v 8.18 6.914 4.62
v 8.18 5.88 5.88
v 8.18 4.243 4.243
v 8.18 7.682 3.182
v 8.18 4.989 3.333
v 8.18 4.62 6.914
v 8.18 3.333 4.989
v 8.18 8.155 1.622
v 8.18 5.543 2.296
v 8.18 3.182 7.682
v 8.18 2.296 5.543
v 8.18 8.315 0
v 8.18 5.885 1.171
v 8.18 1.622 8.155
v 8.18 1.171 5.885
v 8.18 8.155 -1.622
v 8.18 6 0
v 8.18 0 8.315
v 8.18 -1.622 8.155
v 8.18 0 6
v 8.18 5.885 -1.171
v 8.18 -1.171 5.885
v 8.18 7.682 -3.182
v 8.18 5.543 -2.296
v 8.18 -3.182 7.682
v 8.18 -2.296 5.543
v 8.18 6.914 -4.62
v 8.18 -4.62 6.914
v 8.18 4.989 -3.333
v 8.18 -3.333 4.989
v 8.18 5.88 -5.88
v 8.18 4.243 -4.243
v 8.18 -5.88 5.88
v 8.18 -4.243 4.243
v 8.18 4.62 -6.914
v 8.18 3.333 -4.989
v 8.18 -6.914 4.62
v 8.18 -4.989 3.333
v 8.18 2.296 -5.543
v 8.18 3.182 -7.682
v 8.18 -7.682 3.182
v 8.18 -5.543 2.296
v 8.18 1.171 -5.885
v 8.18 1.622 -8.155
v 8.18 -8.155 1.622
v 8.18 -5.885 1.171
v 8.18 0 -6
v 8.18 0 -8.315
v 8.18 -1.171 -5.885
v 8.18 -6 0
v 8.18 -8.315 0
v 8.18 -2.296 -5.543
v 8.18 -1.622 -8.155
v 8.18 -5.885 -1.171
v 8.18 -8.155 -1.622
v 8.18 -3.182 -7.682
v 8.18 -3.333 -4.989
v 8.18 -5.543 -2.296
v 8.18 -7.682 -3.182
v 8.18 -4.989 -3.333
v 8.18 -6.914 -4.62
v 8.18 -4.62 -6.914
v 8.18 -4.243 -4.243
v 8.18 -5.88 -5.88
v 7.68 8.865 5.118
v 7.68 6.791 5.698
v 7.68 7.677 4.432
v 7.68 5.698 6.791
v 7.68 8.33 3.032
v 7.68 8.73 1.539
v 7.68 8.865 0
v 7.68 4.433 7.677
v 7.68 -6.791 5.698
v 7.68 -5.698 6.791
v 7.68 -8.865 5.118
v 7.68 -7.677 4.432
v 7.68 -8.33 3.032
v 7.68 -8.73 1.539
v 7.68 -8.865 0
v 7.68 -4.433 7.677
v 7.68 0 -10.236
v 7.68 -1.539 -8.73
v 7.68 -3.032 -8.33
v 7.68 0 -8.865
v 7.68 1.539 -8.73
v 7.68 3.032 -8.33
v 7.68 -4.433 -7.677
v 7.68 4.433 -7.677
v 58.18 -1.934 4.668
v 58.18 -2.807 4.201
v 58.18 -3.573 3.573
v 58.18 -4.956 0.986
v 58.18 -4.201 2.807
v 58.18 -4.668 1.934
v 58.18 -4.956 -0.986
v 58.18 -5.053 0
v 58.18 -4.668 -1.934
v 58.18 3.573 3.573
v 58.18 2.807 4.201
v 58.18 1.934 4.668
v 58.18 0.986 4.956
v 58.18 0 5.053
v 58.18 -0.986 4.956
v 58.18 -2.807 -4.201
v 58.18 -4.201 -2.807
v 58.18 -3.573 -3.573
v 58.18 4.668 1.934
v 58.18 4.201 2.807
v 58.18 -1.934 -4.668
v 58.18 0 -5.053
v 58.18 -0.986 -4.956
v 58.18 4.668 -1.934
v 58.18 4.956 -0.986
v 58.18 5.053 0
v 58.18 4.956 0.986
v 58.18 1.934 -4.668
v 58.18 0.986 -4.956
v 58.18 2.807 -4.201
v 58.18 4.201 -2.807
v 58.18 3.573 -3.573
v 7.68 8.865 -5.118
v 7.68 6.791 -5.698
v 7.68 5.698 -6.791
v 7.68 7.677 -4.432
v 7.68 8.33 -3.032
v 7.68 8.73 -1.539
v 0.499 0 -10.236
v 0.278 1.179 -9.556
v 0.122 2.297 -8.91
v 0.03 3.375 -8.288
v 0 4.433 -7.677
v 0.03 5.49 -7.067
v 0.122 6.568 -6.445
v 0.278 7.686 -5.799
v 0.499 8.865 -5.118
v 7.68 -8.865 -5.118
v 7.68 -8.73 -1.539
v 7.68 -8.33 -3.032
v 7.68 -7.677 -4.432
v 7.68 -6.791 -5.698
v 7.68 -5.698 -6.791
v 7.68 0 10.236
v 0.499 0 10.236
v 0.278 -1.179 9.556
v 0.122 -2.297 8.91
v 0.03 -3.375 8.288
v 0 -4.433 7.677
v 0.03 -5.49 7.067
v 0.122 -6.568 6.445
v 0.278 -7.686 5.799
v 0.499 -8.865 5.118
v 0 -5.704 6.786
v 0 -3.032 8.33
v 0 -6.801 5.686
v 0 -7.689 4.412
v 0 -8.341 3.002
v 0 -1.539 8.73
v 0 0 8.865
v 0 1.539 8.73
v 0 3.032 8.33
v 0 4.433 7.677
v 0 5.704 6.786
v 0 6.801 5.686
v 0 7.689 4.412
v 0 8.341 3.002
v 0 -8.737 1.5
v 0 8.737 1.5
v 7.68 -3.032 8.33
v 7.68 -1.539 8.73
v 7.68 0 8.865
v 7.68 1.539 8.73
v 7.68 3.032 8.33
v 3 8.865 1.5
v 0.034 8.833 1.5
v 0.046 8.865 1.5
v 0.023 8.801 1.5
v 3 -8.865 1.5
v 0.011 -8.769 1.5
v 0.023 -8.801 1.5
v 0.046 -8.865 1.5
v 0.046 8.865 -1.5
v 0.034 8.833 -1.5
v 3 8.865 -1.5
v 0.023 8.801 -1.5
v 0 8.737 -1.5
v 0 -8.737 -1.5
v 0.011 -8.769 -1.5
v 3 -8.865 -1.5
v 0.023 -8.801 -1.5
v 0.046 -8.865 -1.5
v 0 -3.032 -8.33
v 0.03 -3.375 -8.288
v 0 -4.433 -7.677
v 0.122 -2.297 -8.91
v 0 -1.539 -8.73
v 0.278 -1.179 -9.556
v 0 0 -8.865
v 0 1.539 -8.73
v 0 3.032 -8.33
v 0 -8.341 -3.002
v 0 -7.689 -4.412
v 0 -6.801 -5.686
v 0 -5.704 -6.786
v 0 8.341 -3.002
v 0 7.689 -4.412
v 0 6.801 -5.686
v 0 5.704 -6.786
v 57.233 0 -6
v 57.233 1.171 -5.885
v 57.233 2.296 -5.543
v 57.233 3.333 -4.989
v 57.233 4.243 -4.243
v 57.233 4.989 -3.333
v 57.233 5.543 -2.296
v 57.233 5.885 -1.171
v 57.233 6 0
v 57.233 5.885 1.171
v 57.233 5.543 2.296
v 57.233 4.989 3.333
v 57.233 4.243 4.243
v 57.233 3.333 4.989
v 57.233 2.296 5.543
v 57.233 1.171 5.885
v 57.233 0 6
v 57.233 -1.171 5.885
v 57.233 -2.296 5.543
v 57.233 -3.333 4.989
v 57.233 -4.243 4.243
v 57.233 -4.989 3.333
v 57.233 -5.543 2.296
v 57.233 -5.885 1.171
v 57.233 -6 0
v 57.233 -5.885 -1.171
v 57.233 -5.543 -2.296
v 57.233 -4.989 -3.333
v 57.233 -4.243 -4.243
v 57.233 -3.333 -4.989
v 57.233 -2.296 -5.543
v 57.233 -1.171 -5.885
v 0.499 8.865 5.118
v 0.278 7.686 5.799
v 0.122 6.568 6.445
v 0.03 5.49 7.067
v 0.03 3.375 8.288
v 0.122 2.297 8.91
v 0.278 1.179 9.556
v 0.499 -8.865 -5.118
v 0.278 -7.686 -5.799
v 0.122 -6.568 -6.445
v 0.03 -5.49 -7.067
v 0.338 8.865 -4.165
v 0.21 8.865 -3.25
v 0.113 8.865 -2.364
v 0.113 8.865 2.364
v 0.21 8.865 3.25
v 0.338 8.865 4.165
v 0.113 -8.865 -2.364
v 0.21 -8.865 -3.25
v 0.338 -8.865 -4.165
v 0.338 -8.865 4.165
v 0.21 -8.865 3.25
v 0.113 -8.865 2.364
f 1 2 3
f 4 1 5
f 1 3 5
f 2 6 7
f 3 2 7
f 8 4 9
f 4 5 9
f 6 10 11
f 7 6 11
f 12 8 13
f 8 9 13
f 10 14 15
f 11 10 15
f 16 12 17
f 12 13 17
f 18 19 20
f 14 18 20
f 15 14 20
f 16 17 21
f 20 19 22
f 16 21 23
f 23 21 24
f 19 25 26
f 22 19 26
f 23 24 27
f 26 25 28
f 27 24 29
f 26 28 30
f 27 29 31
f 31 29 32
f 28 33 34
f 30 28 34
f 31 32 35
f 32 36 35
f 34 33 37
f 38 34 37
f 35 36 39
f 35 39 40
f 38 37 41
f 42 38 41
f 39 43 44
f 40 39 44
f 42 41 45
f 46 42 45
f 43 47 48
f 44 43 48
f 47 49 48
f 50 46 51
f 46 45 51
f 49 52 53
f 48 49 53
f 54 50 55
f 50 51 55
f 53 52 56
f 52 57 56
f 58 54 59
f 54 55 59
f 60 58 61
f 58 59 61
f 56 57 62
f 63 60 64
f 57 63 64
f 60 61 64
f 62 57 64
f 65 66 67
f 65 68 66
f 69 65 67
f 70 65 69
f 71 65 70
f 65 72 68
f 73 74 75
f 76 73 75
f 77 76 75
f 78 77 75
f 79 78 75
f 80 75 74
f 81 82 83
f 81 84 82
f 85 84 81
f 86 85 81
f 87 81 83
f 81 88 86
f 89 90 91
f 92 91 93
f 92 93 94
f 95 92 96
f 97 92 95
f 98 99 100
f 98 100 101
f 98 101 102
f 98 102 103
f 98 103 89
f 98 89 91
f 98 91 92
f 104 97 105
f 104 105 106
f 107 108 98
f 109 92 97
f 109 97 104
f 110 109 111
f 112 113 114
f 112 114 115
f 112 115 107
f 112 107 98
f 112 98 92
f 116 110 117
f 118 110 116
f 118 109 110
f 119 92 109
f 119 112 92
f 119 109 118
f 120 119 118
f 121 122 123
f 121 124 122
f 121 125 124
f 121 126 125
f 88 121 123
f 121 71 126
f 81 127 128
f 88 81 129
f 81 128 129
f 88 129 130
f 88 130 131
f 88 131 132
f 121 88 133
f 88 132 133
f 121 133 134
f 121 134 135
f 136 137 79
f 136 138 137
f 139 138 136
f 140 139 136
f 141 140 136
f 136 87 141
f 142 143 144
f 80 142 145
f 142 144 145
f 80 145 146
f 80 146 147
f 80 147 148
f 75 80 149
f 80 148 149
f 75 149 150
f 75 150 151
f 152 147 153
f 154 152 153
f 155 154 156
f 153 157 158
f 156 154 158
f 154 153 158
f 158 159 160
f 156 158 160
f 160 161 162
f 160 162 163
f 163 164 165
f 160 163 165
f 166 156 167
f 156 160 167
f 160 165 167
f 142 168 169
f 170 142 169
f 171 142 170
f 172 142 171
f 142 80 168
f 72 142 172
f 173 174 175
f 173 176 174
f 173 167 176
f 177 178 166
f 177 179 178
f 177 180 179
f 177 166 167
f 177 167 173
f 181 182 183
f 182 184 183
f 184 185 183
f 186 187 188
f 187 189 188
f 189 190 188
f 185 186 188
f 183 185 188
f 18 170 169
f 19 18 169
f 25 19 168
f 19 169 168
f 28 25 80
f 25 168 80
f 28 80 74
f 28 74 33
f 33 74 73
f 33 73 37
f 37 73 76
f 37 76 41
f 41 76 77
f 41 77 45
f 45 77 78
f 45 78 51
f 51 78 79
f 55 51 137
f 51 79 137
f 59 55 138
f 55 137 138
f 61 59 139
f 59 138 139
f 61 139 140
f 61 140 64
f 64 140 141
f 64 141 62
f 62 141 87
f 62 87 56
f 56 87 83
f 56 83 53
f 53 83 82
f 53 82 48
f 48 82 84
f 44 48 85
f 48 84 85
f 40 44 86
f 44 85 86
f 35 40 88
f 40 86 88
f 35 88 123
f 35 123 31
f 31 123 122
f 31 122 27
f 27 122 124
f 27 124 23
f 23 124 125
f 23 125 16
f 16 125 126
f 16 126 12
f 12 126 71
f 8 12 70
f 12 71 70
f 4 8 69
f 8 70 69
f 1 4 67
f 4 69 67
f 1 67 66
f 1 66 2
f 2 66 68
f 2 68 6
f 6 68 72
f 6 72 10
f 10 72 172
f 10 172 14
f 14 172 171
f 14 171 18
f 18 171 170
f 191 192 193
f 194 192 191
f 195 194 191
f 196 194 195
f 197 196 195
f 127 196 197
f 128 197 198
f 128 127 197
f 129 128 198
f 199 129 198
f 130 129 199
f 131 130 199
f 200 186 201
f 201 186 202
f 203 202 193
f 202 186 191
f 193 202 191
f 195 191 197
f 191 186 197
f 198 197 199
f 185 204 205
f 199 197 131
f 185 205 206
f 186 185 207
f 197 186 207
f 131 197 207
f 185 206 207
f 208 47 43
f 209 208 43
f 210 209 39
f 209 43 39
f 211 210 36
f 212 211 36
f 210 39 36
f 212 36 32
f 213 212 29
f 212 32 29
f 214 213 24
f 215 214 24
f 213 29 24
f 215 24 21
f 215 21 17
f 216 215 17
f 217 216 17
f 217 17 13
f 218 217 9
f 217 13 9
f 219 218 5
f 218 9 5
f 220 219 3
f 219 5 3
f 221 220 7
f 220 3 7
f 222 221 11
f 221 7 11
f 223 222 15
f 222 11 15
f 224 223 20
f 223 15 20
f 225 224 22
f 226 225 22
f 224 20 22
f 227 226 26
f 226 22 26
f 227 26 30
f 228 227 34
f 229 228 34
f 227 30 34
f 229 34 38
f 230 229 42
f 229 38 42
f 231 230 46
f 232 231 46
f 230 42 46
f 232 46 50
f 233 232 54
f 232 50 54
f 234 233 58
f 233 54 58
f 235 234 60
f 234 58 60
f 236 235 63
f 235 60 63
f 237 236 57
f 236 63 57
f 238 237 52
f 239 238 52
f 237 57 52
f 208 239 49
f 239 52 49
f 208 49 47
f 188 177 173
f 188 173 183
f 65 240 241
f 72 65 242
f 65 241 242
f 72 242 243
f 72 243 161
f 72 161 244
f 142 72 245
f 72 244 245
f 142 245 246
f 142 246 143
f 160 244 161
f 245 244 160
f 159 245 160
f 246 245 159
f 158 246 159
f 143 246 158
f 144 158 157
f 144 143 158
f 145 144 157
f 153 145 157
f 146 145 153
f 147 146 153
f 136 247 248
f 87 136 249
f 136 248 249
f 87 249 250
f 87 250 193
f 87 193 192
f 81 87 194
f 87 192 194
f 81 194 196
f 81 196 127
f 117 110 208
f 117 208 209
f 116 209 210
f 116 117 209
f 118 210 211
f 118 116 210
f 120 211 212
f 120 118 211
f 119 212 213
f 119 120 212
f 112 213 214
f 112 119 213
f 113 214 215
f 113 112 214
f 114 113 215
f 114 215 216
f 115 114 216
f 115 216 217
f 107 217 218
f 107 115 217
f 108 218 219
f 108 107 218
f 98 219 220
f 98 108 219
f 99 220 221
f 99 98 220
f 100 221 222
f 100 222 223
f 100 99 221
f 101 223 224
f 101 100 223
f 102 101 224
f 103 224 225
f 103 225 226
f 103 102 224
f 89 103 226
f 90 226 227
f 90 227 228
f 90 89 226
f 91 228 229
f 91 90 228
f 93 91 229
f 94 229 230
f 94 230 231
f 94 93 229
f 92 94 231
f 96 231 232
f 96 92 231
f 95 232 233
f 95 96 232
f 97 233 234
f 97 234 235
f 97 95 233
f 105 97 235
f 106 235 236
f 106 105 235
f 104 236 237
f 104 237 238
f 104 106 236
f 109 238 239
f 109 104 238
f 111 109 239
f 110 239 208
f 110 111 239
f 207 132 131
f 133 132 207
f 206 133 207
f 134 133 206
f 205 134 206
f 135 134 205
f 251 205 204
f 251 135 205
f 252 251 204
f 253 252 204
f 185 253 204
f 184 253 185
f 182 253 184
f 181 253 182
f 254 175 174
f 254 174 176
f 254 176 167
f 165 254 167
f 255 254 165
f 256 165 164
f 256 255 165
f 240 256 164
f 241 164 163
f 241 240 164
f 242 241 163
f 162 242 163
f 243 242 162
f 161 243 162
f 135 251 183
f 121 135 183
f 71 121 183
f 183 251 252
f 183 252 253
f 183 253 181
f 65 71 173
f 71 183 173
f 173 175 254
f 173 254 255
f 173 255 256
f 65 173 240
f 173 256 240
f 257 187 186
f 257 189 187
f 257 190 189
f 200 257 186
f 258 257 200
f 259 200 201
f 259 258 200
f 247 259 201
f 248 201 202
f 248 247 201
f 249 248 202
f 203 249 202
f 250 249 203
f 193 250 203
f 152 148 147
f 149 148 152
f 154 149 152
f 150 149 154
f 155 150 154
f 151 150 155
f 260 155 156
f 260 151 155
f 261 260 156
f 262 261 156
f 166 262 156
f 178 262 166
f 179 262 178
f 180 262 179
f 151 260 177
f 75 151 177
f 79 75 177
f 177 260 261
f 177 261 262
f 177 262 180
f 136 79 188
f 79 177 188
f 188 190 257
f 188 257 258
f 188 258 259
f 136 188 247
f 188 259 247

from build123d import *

# Parameters (mm, degrees)
BASEHEAD_DEPTH  = 7.68
SKETCH3_R       = 6
BASEBODY_DEPTH  = 50
CHAMFER1_SIZE   = 0.947
SLOT_DEPTH      = 60.735123043
SLOT_DEPTH_BACK = 60.735123043
SKETCH5_W       = 3
SKETCH5_H       = 3


with BuildPart() as part:
    # Sketch-BaseHead → BaseHead (new body)
    with BuildSketch(Plane(origin=(0, 0, 0), x_dir=(0, 0, -1), z_dir=(1, 0, 0))):
        Polygon((5.118210136, -8.865), (10.236420273, 0), (5.118210136, 8.865), (-5.118210136, 8.865), (-10.236420273, 0), (-5.118210136, -8.865), align=None)
    extrude(amount=BASEHEAD_DEPTH)

    # Sketch1 → Revolve1 (revolve)
    with BuildSketch(Plane.XY, mode=Mode.PRIVATE) as revolve1_sk:
        Polygon((7.68, 0), (8.18, 0), (8.18, -8.315), (7.68, -8.865), align=None)
    revolve(revolve1_sk.sketch.rotate(Axis((-4.001564945, 0, 0), (1, 0, 0)), 270), axis=Axis((-4.001564945, 0, 0), (1, 0, 0)))

    # Sketch3 → BaseBody (add)
    with BuildSketch(Plane(origin=(8.18, 0, 0), x_dir=(0, 0, -1), z_dir=(1, 0, 0))):
        Circle(SKETCH3_R)
    extrude(amount=BASEBODY_DEPTH)

    # Chamfer1
    chamfer1_edges = [part.edges().sort_by_distance(p)[0] for p in [
        (58.18, 0, 6),
    ]]
    chamfer(chamfer1_edges, length=CHAMFER1_SIZE)

    # Sketch4 → HeadChamfer (revolve, cut)
    with BuildSketch(Plane(origin=(-0.264637255, 0, 5.916896391), x_dir=(0, 0, -1), z_dir=(0, 1, 0))):
        Polygon((16.153316664, -0.264637255), (14.781896391, -0.264637255), (16.153316664, -0.763793413), align=None)
    revolve(axis=Axis((-4.001564945, 0, 0), (1, 0, 0)), mode=Mode.SUBTRACT)

    # Sketch5 → Slot (cut, two sides: drawn at the far end of the back side and taken through both)
    with BuildSketch(Plane(origin=(0, 0, 0), x_dir=(1, 0, 0), z_dir=(0, 1, 0)).offset(-SLOT_DEPTH_BACK)):
        with Locations((1.5, 0)):
            Rectangle(SKETCH5_W, SKETCH5_H)
    extrude(amount=SLOT_DEPTH + SLOT_DEPTH_BACK, mode=Mode.SUBTRACT)


solid = part.part
